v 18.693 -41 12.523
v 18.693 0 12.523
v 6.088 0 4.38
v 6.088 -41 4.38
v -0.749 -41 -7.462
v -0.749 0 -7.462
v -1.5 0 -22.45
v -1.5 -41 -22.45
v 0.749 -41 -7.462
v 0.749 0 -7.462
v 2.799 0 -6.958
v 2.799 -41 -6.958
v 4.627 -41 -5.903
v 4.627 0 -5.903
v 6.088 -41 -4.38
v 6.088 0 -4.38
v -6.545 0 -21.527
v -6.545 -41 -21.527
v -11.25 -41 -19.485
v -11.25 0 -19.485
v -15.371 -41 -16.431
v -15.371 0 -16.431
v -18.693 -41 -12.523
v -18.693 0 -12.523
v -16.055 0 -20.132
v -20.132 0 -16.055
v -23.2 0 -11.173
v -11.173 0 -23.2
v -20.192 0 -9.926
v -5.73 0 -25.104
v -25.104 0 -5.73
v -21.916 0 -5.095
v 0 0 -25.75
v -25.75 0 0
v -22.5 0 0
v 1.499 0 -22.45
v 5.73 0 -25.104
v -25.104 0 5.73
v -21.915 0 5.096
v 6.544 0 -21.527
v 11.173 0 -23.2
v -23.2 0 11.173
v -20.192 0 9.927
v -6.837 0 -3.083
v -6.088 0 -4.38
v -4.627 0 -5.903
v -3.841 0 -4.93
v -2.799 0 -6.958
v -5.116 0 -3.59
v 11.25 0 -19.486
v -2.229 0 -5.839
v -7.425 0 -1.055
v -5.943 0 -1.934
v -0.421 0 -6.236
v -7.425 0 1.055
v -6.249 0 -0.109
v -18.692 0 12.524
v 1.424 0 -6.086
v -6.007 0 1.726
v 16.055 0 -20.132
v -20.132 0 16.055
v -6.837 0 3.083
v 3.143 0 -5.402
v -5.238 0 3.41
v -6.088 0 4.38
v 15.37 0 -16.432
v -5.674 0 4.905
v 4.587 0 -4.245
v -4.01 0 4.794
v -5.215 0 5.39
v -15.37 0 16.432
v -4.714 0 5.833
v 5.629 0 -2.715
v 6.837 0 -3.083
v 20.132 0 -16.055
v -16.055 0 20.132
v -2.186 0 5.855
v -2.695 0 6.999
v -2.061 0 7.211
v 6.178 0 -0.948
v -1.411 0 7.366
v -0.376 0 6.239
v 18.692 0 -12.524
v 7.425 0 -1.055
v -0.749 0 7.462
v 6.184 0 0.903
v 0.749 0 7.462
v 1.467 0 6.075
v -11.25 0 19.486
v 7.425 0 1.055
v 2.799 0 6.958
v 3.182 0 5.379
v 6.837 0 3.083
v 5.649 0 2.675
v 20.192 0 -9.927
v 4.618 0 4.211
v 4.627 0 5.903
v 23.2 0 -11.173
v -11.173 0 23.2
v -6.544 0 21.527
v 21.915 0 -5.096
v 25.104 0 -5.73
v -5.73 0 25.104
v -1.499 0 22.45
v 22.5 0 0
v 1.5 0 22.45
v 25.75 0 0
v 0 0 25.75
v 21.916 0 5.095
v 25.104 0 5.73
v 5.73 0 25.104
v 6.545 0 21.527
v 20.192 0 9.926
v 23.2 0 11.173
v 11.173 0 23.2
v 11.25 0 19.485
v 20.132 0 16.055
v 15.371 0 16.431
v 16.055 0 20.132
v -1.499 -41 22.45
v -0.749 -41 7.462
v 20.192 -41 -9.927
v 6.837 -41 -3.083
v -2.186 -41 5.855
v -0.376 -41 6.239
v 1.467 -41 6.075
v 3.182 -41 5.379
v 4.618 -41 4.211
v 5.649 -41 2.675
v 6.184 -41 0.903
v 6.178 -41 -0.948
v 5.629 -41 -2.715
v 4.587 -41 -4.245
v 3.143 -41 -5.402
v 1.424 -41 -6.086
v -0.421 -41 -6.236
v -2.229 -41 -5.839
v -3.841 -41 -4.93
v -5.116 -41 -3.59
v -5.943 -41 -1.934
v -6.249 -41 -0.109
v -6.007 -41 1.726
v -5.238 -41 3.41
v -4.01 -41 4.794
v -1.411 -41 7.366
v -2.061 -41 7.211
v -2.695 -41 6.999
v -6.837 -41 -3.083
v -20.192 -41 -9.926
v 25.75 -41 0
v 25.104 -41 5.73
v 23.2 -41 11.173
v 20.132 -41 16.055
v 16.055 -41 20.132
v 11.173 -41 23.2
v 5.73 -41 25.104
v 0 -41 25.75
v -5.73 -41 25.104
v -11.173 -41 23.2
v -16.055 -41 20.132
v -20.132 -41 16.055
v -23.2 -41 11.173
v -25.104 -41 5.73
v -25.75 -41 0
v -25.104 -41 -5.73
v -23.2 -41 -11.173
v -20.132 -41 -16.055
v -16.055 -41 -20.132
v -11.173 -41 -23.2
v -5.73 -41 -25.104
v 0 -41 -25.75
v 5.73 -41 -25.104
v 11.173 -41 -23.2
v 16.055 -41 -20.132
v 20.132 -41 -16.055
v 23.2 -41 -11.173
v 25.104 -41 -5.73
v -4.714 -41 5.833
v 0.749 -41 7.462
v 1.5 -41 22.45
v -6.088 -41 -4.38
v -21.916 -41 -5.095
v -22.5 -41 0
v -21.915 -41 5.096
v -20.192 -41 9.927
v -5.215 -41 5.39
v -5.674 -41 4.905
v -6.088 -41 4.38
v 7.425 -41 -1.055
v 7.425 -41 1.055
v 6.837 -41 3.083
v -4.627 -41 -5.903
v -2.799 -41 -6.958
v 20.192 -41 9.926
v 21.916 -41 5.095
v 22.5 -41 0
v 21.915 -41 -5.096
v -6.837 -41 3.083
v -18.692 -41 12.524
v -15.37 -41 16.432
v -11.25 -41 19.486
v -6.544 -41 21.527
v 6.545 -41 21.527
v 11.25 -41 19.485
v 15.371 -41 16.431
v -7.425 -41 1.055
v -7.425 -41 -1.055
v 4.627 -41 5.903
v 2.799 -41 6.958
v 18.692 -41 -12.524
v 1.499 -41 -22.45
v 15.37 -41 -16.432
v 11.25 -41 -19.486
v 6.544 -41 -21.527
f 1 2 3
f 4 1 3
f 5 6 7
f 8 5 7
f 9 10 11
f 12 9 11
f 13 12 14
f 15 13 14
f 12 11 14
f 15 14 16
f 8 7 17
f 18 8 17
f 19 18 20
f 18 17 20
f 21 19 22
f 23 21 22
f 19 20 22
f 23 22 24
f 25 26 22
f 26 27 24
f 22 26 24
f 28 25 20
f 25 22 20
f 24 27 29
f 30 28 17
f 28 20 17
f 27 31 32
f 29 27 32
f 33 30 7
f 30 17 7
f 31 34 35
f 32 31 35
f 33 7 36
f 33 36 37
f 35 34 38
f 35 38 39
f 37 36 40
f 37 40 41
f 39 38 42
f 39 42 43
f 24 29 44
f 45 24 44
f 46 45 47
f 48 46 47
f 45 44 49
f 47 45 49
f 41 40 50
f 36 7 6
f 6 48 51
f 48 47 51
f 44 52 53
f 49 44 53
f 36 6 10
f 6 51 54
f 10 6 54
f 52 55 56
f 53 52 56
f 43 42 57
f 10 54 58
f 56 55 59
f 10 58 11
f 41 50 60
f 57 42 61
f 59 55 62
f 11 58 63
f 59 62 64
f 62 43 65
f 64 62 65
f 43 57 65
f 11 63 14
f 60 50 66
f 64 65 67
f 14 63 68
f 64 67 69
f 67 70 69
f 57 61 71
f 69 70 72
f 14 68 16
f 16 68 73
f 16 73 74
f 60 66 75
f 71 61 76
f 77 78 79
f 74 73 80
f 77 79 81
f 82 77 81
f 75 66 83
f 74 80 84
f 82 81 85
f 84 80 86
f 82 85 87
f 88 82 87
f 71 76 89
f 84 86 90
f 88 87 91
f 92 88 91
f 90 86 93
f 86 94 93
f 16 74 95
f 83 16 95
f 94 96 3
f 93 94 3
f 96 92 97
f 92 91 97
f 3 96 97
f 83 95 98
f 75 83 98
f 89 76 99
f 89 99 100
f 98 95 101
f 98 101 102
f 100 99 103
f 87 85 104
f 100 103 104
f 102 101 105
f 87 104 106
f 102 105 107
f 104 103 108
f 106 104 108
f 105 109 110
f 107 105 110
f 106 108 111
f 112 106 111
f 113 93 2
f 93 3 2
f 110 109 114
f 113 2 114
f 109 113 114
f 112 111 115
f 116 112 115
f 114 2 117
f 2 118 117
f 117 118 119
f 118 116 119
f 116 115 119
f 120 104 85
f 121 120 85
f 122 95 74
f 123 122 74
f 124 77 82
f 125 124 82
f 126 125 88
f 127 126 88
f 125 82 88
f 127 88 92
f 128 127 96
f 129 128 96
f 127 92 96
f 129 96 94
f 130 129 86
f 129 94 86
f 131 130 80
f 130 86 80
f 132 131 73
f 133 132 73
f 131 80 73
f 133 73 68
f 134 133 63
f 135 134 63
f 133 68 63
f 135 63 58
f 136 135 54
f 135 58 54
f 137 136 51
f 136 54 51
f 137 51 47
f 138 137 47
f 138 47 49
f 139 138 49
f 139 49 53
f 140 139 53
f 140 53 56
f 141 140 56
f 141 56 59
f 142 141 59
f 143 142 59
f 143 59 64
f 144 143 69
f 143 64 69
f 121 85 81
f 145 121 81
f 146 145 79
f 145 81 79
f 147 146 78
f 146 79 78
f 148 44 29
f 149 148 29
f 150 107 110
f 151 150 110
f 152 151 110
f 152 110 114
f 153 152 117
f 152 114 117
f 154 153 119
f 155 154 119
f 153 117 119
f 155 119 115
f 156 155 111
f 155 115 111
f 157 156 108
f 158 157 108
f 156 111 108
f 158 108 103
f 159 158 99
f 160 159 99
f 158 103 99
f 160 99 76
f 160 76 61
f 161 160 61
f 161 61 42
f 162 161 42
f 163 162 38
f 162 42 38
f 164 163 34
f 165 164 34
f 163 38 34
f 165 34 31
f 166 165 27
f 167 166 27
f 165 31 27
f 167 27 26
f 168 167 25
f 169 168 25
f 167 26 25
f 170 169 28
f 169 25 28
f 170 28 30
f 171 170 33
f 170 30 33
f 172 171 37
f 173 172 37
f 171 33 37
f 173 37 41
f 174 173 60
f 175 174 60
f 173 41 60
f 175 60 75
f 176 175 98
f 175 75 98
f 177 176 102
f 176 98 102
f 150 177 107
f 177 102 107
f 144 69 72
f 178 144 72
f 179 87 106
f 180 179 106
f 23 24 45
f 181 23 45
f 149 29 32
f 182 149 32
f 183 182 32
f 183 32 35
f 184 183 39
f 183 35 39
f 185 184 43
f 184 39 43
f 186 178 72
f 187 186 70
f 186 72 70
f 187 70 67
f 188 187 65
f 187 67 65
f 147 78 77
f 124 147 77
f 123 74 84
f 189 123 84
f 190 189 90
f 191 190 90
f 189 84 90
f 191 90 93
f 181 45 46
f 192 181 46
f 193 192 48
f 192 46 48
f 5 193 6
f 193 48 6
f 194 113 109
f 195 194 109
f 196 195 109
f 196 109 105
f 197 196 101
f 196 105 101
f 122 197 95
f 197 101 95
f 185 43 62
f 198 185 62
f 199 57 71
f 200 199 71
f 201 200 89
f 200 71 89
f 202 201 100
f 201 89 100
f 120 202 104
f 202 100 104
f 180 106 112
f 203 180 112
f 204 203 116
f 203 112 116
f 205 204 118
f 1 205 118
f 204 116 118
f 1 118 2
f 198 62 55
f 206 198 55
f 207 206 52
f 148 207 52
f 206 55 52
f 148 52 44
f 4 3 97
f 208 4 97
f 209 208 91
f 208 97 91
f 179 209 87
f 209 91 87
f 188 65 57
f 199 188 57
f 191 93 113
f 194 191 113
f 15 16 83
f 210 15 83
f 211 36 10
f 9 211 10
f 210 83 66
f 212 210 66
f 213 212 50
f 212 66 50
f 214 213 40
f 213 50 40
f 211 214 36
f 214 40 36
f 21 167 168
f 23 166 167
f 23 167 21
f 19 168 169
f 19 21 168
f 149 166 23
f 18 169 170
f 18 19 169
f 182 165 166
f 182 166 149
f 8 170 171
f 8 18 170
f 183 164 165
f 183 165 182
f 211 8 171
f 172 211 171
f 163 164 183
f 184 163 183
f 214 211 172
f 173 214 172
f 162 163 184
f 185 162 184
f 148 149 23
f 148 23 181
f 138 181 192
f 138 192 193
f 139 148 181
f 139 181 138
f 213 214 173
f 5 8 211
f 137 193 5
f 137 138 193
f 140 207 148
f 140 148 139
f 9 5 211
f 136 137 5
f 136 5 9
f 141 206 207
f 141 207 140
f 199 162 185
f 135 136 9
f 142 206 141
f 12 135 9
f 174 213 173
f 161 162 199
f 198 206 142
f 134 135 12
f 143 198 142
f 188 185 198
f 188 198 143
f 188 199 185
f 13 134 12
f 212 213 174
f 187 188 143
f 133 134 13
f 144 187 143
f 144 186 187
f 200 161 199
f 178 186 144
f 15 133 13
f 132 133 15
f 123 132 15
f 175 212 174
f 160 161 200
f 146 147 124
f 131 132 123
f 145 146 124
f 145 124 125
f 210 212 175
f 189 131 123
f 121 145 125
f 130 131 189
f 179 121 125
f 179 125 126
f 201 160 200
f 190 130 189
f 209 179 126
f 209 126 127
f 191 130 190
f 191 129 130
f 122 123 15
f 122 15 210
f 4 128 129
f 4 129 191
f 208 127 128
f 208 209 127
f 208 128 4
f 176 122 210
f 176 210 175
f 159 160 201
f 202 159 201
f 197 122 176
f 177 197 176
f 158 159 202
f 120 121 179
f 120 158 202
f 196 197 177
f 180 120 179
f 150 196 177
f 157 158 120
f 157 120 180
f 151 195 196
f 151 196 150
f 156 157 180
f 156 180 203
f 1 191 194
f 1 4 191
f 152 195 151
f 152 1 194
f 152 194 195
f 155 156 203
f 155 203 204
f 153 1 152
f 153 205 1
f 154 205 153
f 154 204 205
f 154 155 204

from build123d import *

# Parameters (mm, degrees)
F0_R     = 25.75
F1_DEPTH = 41


with BuildPart() as f1:
    # F0 (on Front) → F1 (new body)
    with BuildSketch(Plane.XZ):
        Circle(F0_R)
        with BuildLine():
            ThreePointArc((-1.5, -22.449944), (-11.250362, -19.485363), (-18.692687, -12.523316))
            Line((-18.692687, -12.523316), (-6.088184, -4.379957))
            ThreePointArc((-6.088184, -4.379957), (-3.75, -6.495191), (-0.749062, -7.4625))
            Line((-0.749062, -7.4625), (-1.5, -22.449944))
        make_face(mode=Mode.SUBTRACT)
        with BuildLine():
            ThreePointArc((18.692222, -12.52401), (11.249638, -19.48578), (1.499166, -22.45))
            Line((1.499166, -22.45), (0.749062, -7.4625))
            ThreePointArc((0.749062, -7.4625), (3.75, -6.495191), (6.088184, -4.379957))
            Line((6.088184, -4.379957), (18.692222, -12.52401))
        make_face(mode=Mode.SUBTRACT)
        with BuildLine():
            ThreePointArc((20.192222, 9.925934), (22.5, -0.000418), (20.191854, -9.926684))
            Line((20.191854, -9.926684), (6.837246, -3.082543))
            ThreePointArc((6.837246, -3.082543), (7.5, 0), (6.837246, 3.082543))
            Line((6.837246, 3.082543), (20.192222, 9.925934))
        make_face(mode=Mode.SUBTRACT)
        with BuildLine():
            ThreePointArc((-20.192222, -9.925934), (-22.5, 0.000418), (-20.191854, 9.926684))
            Line((-20.191854, 9.926684), (-6.837246, 3.082543))
            ThreePointArc((-6.837246, 3.082543), (-7.5, 0), (-6.837246, -3.082543))
            Line((-6.837246, -3.082543), (-20.192222, -9.925934))
        make_face(mode=Mode.SUBTRACT)
        with BuildLine():
            ThreePointArc((-2.186485, 5.855065), (3.143303, -5.40205), (-4.009937, 4.794049))
            Line((-4.009937, 4.794049), (-4.714155, 5.833245))
            ThreePointArc((-4.714155, 5.833245), (-5.44983, 5.152607), (-6.088184, 4.379957))
            Line((-6.088184, 4.379957), (-18.692222, 12.52401))
            ThreePointArc((-18.692222, 12.52401), (-11.249638, 19.48578), (-1.499166, 22.45))
            Line((-1.499166, 22.45), (-0.749062, 7.4625))
            ThreePointArc((-0.749062, 7.4625), (-1.737374, 7.295994), (-2.69466, 6.9992))
            Line((-2.69466, 6.9992), (-2.186485, 5.855065))
        make_face(mode=Mode.SUBTRACT)
        with BuildLine():
            Line((0.749062, 7.4625), (1.5, 22.449944))
            ThreePointArc((1.5, 22.449944), (11.250362, 19.485363), (18.692687, 12.523316))
            Line((18.692687, 12.523316), (6.088184, 4.379957))
            ThreePointArc((6.088184, 4.379957), (3.75, 6.495191), (0.749062, 7.4625))
        make_face(mode=Mode.SUBTRACT)
    extrude(amount=F1_DEPTH)


solid = f1.part
